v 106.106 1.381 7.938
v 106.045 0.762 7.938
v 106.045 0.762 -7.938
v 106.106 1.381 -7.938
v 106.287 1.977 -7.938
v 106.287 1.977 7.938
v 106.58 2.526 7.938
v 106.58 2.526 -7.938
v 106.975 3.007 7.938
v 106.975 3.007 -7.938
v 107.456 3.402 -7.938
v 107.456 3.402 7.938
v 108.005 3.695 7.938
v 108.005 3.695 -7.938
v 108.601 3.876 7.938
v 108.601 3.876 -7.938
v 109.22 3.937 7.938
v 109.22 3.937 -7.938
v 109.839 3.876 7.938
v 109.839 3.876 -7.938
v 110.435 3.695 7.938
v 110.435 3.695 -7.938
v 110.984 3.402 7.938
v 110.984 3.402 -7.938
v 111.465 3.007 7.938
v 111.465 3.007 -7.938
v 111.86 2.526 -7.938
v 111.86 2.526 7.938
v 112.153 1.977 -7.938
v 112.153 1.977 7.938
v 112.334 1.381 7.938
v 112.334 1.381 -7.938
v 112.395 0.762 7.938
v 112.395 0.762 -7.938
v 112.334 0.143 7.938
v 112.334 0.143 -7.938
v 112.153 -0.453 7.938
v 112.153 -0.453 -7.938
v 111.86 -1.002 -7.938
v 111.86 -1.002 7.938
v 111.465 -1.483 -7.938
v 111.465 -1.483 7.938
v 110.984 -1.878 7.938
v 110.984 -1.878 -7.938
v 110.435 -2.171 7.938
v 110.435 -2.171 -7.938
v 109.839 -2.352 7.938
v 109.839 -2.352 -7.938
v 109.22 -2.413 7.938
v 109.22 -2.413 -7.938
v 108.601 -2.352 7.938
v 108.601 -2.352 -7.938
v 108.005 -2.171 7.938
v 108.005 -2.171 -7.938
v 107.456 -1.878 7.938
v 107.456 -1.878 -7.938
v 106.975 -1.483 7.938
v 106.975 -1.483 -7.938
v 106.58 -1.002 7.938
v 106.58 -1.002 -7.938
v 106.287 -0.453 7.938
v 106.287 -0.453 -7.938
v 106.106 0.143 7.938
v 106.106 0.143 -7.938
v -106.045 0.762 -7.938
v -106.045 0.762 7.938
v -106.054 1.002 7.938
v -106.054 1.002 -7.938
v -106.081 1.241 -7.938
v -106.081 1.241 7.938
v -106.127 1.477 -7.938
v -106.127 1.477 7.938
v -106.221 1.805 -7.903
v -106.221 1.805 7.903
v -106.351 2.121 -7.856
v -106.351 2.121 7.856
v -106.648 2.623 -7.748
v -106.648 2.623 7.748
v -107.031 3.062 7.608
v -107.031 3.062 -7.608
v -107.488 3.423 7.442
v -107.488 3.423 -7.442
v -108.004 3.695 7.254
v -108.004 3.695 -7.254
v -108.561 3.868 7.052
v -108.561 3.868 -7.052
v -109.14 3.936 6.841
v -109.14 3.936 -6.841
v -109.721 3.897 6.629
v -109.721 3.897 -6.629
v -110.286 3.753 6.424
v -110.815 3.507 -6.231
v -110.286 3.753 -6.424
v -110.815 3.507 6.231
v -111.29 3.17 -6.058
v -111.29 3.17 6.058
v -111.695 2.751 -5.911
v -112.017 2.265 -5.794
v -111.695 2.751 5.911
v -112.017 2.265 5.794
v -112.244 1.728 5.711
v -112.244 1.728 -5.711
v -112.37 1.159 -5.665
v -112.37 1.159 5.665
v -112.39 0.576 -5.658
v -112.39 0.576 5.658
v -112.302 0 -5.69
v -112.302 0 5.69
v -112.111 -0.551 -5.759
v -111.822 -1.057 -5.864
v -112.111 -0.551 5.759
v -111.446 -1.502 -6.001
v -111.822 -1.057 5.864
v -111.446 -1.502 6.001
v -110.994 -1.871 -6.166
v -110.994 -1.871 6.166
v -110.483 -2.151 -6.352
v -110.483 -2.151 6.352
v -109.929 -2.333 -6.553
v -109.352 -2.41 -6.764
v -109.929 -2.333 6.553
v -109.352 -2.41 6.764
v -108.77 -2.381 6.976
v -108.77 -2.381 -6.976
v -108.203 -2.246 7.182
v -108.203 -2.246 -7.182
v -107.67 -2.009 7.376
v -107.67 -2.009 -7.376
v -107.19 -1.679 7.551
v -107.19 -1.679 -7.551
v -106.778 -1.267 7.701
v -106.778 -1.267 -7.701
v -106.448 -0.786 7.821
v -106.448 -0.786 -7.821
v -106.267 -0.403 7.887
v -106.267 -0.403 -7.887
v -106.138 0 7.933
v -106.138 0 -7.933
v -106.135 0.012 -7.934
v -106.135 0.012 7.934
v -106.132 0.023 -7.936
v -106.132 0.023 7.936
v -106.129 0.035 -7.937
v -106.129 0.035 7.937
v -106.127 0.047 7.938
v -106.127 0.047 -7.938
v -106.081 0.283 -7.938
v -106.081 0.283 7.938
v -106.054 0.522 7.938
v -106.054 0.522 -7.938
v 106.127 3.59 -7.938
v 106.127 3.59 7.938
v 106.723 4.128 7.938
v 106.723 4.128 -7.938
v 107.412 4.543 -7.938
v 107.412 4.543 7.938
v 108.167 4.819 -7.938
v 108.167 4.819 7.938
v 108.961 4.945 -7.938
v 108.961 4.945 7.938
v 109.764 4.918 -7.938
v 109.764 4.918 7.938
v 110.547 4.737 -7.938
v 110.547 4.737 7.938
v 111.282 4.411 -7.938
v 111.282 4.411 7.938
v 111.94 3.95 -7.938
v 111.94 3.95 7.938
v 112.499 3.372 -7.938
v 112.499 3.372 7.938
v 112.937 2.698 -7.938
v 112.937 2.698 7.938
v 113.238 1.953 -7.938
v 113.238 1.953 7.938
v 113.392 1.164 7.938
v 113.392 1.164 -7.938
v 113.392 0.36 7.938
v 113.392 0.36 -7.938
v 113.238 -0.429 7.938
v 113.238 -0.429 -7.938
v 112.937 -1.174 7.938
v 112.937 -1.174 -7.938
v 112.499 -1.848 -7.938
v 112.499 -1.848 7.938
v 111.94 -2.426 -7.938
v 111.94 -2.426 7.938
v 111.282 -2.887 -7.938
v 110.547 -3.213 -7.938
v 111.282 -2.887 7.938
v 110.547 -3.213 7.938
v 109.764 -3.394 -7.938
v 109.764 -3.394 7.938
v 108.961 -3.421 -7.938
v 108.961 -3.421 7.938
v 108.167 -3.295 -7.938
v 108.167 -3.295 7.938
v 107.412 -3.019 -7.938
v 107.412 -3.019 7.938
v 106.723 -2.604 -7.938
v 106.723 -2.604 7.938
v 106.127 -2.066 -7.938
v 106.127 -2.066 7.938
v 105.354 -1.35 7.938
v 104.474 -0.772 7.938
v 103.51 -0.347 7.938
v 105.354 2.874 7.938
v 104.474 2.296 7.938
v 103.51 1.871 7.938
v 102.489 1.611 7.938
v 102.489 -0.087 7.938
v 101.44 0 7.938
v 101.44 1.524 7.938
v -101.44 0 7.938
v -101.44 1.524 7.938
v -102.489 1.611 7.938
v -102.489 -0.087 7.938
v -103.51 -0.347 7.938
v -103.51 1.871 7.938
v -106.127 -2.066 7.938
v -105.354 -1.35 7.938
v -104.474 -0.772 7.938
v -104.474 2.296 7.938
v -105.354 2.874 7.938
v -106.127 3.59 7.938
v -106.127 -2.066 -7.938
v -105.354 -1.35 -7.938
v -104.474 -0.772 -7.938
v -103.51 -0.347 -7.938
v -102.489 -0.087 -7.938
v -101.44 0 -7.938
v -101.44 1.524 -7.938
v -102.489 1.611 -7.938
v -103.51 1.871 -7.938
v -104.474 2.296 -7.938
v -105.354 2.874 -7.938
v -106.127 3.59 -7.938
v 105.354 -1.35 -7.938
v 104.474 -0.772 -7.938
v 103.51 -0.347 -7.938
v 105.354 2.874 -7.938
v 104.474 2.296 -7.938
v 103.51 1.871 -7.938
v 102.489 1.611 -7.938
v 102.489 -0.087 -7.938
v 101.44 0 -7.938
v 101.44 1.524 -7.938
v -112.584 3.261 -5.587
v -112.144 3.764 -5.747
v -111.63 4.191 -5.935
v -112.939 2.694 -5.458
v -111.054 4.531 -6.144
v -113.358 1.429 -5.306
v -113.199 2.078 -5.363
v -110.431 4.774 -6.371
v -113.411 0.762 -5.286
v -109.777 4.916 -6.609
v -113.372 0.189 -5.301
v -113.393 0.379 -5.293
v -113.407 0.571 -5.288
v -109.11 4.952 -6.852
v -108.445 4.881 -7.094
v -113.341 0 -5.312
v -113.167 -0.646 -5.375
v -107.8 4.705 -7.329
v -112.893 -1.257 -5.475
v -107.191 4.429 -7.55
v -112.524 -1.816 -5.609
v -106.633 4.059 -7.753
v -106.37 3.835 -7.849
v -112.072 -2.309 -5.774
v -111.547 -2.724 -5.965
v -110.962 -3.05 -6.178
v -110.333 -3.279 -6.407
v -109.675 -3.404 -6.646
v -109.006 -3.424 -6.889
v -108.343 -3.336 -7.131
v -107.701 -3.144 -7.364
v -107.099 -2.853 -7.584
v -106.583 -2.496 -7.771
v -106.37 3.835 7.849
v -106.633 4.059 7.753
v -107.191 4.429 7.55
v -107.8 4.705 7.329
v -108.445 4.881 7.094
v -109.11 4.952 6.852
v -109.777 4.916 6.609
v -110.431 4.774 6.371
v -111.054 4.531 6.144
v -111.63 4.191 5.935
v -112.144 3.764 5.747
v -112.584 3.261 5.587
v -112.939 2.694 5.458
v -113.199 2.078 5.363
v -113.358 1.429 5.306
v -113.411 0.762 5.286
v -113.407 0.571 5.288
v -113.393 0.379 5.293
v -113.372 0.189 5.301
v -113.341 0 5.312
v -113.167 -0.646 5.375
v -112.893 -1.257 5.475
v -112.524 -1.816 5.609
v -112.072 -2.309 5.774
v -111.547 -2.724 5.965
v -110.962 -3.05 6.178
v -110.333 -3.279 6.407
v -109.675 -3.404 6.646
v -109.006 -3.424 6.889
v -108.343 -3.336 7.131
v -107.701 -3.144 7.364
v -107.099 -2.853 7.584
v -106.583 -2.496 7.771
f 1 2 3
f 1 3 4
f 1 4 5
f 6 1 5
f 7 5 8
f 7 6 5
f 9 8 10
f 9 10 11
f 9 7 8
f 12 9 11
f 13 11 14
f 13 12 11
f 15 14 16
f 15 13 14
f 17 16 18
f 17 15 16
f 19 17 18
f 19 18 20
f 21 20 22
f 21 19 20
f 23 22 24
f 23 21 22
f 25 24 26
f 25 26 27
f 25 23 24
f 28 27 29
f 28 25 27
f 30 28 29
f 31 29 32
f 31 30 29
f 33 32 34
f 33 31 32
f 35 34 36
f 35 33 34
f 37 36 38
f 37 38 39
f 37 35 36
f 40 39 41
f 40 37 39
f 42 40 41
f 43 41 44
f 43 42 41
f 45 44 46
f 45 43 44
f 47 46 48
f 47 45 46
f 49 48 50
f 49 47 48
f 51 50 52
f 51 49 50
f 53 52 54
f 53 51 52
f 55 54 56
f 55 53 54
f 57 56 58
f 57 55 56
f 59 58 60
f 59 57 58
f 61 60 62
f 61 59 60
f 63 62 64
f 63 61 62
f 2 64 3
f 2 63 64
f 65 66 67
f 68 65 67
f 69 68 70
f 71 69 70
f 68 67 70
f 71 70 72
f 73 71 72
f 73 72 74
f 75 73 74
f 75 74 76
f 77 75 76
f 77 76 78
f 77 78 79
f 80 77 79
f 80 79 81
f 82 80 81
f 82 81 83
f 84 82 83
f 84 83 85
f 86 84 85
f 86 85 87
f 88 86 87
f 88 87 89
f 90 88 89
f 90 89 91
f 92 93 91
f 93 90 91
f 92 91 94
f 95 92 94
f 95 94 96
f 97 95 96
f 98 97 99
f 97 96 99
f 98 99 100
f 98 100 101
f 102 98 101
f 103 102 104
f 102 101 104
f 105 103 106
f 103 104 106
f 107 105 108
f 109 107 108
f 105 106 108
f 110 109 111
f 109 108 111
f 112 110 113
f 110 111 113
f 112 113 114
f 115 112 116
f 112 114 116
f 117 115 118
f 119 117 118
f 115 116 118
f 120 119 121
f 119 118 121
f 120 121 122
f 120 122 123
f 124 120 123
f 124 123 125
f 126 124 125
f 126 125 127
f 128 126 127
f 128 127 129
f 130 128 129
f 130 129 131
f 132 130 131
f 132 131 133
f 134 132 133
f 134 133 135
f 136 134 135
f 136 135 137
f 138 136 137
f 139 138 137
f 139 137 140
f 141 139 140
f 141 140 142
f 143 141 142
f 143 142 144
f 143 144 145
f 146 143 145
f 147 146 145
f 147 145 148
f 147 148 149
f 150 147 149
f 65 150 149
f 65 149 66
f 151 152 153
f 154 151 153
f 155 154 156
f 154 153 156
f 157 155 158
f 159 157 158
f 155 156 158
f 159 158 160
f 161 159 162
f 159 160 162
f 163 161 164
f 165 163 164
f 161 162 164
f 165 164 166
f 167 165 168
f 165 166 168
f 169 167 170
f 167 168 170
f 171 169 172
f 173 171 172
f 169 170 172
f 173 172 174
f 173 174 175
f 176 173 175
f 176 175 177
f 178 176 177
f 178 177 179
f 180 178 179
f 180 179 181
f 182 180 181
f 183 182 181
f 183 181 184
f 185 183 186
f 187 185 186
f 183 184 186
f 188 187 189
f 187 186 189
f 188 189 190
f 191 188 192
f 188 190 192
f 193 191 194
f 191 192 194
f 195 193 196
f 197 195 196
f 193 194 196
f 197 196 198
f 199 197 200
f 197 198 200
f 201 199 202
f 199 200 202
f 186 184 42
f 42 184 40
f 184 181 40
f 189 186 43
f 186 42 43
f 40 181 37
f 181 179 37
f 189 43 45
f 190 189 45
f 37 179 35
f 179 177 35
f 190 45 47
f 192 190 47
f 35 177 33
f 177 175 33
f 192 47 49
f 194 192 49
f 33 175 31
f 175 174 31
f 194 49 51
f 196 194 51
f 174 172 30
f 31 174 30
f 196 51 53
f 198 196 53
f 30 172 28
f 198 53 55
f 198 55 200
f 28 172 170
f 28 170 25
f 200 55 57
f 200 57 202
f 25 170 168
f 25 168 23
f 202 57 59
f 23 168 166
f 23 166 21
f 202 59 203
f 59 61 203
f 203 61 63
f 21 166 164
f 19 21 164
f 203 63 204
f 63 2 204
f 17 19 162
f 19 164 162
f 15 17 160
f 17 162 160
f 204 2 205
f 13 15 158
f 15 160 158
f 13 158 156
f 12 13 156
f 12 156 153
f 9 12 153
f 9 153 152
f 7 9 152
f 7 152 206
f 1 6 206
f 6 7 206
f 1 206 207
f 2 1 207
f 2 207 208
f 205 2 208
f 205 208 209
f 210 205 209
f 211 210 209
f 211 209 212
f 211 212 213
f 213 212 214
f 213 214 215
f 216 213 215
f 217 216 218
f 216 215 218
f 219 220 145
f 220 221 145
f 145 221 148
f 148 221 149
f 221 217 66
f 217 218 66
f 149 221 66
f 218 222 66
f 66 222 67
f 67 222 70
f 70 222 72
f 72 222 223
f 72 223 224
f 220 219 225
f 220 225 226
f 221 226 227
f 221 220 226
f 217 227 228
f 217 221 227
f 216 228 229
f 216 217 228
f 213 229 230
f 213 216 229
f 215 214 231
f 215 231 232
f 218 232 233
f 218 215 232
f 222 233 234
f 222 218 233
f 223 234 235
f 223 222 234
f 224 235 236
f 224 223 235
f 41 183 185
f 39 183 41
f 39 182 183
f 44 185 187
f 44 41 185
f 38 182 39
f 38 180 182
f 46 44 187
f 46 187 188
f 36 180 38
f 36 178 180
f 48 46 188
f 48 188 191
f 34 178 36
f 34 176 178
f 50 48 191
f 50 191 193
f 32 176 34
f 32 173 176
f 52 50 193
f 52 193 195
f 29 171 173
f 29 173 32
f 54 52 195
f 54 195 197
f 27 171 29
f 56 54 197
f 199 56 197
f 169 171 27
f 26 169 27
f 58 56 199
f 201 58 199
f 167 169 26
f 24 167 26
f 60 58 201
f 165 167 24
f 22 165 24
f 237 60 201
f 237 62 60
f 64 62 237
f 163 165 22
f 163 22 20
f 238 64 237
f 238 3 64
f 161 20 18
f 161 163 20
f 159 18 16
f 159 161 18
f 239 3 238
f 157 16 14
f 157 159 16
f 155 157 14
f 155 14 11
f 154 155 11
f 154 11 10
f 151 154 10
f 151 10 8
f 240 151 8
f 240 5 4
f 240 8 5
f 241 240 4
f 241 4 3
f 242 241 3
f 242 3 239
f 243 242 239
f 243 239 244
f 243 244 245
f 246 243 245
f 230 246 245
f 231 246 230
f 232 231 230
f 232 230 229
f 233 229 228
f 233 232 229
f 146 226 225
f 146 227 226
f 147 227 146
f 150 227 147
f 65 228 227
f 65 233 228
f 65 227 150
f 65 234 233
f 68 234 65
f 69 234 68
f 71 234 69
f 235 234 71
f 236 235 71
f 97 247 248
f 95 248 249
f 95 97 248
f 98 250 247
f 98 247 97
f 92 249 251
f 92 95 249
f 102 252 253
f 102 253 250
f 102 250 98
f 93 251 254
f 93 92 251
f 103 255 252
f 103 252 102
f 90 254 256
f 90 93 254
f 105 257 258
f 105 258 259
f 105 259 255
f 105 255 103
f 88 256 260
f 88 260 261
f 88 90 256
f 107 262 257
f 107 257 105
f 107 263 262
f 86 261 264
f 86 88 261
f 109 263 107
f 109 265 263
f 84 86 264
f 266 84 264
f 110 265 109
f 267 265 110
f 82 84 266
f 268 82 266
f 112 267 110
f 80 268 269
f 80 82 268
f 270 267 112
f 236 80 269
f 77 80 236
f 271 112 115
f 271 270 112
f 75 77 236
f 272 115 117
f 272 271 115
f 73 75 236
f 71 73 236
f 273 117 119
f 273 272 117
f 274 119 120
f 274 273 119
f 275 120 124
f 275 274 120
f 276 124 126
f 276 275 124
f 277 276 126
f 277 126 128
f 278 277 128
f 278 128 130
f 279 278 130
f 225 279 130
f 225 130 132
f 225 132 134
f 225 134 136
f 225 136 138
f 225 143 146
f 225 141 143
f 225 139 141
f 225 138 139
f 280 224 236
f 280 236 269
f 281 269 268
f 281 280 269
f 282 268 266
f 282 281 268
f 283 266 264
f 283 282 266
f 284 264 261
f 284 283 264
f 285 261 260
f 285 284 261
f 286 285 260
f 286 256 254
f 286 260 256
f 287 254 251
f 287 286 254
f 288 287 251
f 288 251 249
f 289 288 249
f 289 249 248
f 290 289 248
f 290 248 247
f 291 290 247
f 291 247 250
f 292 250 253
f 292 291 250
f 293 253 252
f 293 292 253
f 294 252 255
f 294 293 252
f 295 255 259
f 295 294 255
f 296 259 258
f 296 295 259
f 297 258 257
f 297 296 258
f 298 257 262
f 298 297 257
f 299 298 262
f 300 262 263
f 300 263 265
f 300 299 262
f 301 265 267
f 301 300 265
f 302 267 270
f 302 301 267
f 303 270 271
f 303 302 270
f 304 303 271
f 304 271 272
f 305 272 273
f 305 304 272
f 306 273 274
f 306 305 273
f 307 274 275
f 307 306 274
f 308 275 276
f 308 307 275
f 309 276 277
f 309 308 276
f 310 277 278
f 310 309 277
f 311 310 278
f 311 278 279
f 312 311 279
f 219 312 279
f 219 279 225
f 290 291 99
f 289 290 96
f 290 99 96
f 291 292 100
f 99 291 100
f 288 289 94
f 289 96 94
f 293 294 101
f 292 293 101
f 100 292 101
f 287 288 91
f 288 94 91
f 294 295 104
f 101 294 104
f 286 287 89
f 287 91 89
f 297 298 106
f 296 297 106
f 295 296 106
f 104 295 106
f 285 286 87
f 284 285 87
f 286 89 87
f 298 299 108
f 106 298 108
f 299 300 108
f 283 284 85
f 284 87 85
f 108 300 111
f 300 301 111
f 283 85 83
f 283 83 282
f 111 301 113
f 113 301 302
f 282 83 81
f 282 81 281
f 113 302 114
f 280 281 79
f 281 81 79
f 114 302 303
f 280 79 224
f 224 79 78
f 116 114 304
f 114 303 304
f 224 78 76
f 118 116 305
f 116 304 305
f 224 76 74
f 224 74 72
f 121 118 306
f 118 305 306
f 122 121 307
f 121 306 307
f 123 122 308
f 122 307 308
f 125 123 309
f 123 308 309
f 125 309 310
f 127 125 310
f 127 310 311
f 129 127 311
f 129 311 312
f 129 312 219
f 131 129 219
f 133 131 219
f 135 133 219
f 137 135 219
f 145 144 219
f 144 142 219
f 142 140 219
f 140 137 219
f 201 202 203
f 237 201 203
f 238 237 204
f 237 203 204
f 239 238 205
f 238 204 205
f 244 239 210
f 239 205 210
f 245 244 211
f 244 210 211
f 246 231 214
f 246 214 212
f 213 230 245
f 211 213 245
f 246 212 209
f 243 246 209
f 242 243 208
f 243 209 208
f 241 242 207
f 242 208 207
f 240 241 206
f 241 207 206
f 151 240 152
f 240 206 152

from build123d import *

# Parameters (mm, degrees)
SKETCH1_W               = 203.2
SKETCH1_H               = 15.875
BOSS_EXTRUDE1_DEPTH     = 1.524
SKETCH5_R               = 3.175
BOSS_EXTRUDE5_DEPTH     = 15.875
CUT_EXTRUDE1_DEPTH      = 4.429
CUT_EXTRUDE1_DEPTH_BACK = 5.953


with BuildPart() as part:
    # Sketch1 → Boss-Extrude1 (new body)
    with BuildSketch(Plane(origin=(0, 0, 0), x_dir=(1, 0, 0), z_dir=(0, 1, 0))):
        Rectangle(SKETCH1_W, SKETCH1_H)
    extrude(amount=BOSS_EXTRUDE1_DEPTH)

    # Sketch5 → Boss-Extrude5 (add, through all)
    with BuildSketch(Plane.XY.offset(7.9375)):
        with BuildLine():
            ThreePointArc((-106.126651501, -2.065662651), (-104.000712573, -0.539318363), (-101.439759837, 0))
            Line((-101.439759837, 0), (-101.6, 0))
            Line((-101.6, 0), (-101.6, 1.524))
            Line((-101.6, 1.524), (-101.439759837, 1.524))
            ThreePointArc((-101.439759837, 1.524), (-104.000712573, 2.063318363), (-106.126651501, 3.589662651))
            ThreePointArc((-106.126651501, 3.589662651), (-113.411, 0.762), (-106.126651501, -2.065662651))
        make_face()
        with Locations((-109.22, 0.762)):
            Circle(SKETCH5_R, mode=Mode.SUBTRACT)
    boss_extrude5 = extrude(amount=-BOSS_EXTRUDE5_DEPTH)

    # Mirror1: Boss-Extrude5 across plane
    add(boss_extrude5.mirror(Plane(origin=(0, 0, 0), x_dir=(0, 0, 1), z_dir=(1, 0, 0))))

    # Sketch6 → Cut-Extrude1 (cut, two sides)
    with BuildSketch(Plane.XZ) as cut_extrude1_sk:
        Polygon((-113.411, -5.28621397), (-106.126651501, -7.9375), (-113.411, -7.9375), align=None)
        Polygon((-113.411, 7.9375), (-113.411, 5.28621397), (-106.126651501, 7.9375), align=None)
    extrude(amount=CUT_EXTRUDE1_DEPTH, mode=Mode.SUBTRACT)
    extrude(cut_extrude1_sk.sketch, amount=-CUT_EXTRUDE1_DEPTH_BACK, mode=Mode.SUBTRACT)


solid = part.part
